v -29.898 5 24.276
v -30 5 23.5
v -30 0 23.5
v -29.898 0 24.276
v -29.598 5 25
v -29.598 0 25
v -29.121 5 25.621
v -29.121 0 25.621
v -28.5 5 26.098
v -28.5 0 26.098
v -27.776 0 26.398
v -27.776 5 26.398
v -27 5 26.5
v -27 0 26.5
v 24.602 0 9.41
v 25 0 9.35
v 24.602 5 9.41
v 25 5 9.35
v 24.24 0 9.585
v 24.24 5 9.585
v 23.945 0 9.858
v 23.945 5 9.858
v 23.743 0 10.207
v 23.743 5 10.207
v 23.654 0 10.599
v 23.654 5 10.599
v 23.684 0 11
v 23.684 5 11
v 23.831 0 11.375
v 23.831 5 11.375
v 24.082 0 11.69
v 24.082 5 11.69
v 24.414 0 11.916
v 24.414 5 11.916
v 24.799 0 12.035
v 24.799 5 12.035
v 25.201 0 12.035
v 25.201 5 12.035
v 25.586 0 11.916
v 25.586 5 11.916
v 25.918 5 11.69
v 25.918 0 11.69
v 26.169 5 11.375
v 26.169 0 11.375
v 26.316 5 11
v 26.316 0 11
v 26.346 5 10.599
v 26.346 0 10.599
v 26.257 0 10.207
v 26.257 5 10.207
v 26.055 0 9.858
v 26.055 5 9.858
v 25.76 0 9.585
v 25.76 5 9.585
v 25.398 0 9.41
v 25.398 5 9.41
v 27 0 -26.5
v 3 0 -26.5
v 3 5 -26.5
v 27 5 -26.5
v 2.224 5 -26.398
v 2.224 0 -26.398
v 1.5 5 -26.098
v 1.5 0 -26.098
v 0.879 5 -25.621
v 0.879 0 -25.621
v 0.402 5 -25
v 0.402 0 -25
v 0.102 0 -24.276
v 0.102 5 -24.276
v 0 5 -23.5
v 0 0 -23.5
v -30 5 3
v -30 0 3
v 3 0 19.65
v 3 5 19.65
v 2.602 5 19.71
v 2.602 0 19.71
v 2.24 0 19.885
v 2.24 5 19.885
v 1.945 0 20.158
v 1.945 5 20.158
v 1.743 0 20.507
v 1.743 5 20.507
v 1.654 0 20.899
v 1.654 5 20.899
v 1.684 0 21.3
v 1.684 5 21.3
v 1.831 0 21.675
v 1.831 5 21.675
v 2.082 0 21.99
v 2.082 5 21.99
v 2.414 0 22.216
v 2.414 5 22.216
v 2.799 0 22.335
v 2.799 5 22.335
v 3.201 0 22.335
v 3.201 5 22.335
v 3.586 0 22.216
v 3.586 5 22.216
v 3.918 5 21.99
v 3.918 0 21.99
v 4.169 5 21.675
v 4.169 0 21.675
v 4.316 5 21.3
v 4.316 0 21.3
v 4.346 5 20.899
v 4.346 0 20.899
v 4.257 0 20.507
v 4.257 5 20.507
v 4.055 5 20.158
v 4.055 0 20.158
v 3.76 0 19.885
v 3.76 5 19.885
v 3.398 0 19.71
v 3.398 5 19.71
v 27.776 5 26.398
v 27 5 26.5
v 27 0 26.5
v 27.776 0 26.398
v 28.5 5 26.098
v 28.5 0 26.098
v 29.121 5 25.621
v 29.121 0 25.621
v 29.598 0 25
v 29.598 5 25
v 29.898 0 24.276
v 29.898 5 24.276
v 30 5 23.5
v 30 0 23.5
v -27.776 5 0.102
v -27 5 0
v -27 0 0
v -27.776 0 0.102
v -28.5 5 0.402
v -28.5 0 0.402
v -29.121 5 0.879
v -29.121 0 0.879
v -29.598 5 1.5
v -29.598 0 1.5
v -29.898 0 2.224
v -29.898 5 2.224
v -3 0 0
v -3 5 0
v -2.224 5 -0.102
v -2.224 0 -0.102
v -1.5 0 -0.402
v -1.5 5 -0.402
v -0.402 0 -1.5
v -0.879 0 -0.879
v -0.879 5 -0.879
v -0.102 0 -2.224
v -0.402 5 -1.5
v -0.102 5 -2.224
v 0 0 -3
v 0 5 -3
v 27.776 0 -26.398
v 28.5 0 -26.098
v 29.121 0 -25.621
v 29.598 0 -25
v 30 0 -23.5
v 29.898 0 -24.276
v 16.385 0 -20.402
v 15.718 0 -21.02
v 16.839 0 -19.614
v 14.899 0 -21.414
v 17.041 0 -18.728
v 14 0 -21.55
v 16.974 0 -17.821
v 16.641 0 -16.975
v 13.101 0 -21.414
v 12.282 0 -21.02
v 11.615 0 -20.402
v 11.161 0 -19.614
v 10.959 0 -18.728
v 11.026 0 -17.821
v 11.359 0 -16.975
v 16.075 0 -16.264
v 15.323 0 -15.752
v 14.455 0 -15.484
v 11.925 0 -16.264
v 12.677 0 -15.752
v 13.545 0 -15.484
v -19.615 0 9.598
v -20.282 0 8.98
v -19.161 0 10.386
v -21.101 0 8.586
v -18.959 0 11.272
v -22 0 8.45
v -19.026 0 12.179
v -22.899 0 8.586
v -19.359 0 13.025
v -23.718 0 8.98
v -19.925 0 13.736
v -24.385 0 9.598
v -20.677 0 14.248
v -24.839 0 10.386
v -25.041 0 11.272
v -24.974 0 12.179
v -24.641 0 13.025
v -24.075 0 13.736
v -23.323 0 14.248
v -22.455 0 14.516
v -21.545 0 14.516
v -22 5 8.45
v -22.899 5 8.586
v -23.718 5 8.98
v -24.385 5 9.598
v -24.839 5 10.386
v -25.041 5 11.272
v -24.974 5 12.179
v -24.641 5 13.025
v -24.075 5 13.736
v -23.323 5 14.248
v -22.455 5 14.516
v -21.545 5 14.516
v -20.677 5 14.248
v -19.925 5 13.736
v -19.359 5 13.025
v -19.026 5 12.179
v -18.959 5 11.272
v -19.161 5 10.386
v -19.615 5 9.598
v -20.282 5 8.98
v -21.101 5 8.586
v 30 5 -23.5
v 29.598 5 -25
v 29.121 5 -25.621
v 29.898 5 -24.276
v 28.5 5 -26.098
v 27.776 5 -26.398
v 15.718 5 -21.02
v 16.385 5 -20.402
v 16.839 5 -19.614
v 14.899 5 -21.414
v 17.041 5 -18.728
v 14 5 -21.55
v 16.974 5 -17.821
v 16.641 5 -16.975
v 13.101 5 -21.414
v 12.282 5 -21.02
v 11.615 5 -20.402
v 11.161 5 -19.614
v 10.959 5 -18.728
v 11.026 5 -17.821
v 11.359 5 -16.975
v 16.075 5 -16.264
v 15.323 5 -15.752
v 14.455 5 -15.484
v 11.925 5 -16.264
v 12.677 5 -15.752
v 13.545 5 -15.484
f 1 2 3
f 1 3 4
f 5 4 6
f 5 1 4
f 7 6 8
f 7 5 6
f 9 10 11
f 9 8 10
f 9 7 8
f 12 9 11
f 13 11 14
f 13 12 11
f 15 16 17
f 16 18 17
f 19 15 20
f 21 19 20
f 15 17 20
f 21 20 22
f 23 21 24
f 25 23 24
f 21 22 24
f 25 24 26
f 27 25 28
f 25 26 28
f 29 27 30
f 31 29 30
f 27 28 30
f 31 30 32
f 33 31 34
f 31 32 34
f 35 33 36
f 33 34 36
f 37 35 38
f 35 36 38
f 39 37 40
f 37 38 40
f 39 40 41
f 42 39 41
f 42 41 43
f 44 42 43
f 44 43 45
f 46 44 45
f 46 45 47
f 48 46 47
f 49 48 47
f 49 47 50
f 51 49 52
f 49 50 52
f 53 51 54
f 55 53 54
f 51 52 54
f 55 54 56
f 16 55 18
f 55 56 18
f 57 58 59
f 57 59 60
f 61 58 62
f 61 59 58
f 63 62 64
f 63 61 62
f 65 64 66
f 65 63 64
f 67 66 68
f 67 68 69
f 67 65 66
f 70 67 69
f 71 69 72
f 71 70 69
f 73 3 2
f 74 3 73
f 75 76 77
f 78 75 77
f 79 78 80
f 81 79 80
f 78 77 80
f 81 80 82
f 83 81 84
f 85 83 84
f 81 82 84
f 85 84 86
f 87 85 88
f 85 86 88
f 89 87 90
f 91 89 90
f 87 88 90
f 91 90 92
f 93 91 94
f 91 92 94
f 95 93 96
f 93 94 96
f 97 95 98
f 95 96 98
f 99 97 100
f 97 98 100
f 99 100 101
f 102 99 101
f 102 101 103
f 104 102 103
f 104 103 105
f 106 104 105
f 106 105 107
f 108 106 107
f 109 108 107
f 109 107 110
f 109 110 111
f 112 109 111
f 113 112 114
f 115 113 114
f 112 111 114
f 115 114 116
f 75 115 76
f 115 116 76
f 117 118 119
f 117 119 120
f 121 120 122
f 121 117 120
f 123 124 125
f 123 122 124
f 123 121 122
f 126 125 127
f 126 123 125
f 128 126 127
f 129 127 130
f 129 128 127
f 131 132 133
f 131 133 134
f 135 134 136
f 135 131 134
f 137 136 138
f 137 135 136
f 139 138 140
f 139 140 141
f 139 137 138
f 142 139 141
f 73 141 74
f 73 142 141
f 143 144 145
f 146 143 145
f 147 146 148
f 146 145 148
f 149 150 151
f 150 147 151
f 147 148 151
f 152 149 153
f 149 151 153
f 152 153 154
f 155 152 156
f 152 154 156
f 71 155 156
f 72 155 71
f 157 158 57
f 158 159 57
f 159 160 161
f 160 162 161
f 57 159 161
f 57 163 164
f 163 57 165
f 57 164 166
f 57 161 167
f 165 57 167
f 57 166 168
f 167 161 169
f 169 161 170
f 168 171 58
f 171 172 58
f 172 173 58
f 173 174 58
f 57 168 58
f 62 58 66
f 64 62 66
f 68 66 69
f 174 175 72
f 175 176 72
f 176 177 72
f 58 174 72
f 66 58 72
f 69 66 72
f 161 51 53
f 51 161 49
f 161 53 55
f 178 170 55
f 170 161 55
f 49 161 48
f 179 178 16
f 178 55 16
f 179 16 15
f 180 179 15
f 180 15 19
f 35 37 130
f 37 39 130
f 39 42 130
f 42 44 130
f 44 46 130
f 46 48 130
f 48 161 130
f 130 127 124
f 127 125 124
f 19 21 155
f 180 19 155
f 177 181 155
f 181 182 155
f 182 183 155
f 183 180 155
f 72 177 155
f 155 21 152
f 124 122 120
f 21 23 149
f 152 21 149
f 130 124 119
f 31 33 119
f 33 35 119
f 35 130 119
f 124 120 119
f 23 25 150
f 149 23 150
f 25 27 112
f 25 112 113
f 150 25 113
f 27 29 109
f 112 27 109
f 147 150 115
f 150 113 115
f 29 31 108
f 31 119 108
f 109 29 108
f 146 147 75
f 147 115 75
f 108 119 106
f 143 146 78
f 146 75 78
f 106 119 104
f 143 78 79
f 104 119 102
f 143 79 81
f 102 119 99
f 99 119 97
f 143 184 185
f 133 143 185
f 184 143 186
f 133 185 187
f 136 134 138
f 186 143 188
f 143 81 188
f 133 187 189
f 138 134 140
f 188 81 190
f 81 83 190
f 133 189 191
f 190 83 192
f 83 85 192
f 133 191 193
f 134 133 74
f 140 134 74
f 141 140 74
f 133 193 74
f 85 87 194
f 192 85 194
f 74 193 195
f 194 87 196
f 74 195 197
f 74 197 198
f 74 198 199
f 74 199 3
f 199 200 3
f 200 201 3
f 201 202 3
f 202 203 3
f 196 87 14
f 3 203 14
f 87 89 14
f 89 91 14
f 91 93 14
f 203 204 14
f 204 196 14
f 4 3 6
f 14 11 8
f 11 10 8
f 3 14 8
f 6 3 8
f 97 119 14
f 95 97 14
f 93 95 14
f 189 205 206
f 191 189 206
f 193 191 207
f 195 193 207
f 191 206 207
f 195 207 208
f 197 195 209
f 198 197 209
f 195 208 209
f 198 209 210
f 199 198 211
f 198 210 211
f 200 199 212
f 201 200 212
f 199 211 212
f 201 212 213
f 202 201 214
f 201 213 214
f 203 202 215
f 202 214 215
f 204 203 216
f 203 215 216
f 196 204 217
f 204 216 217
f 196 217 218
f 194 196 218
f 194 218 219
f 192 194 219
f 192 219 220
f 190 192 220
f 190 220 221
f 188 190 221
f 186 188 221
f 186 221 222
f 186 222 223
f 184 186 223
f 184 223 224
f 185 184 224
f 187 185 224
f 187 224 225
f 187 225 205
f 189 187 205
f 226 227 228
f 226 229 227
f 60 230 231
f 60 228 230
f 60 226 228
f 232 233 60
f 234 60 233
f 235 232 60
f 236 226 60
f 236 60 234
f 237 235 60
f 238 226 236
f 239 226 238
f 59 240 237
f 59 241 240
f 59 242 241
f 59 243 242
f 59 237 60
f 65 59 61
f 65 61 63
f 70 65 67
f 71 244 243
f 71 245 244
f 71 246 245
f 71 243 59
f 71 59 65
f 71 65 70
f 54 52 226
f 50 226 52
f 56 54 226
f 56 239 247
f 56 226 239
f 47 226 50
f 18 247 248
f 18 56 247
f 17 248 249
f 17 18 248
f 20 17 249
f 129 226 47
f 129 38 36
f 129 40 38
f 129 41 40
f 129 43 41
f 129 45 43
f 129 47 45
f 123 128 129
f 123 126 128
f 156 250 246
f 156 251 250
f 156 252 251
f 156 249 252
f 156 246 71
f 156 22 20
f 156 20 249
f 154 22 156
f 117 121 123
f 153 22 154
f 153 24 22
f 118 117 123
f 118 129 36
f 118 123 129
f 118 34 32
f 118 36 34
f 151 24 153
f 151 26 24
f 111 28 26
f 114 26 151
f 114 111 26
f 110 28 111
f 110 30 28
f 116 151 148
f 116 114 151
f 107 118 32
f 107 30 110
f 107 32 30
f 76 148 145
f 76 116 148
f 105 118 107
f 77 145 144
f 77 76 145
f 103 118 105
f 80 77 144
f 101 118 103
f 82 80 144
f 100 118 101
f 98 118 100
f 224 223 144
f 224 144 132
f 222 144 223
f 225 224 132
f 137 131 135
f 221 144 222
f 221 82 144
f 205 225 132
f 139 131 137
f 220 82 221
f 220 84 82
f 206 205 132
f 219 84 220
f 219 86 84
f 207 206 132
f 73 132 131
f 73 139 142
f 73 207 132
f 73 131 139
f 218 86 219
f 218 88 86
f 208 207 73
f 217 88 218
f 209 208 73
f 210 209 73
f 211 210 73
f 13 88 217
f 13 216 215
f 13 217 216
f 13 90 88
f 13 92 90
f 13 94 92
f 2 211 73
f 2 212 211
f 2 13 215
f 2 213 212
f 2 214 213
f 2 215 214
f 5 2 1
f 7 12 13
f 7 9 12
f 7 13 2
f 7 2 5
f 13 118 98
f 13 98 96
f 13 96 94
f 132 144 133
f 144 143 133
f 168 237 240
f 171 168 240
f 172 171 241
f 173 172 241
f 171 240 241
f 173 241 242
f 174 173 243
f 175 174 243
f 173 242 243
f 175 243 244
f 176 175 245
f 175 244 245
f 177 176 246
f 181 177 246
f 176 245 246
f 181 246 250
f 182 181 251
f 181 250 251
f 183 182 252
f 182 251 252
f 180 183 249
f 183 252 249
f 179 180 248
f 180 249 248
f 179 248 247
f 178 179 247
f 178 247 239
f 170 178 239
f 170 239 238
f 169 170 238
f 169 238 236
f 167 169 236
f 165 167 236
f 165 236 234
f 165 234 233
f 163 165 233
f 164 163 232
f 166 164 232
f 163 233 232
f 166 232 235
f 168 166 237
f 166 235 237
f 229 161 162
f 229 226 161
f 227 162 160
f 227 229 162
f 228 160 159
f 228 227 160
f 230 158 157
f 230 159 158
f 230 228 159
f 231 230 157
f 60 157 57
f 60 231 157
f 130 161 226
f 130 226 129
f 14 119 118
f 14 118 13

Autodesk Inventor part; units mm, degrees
ref_plane "YZ Plane" through (0, 0, 0) normal (1, 0, 0) x (0, 1, 0)
ref_plane "XZ Plane" through (0, 0, 0) normal (0, 1, 0) x (-1, 0, 0)
ref_plane "XY Plane" through (0, 0, 0) normal (0, 0, 1) x (1, 0, 0)
sketch "Sketch1" plane through (0, 0, 0) normal (0, 1, 0) x (-1, 0, 0)
  line L0 (30, -26.5) -> (-30, -26.5)
  line L1 (-30, -26.5) -> (-30, 26.5)
  line L2 (-30, 26.5) -> (30, 26.5)
  line L3 (30, 26.5) -> (30, -26.5)
  line L4 (30, -26.5) -> (-30, 26.5) construction
  line L5 (-30, -26.5) -> (30, 26.5) construction
  line L6 (-3, 21) -> (-25, 21) construction
  line L7 (-25, 21) -> (-25, 10.7) construction
  line L8 (-25, 10.7) -> (-3, 10.7) construction
  line L9 (-3, 10.7) -> (-3, 21) construction
  line L10 (0, 0) -> (30, 0)
  line L11 (0, 0) -> (0, -26.5)
  point P0 (-14, -18.5)
  point P1 (-14, 10.7)
  point P2 (22, 11.5)
  dimension "d0" = 60
  dimension "d1" = 53
  dimension "d2" = 5
  dimension "d3" = 5.5
  dimension "d4" = 22
  dimension "d5" = 10.3
  dimension "d6" = 45
  dimension "d7" = 8
  dimension "d8" = 15
extrude "Extrusion1" add sketch "Sketch1" along normal blind 5 contours L0 L1 L2 L3 L10 L11
hole "Hole1" at (3, 0, 21) at (25, 0, 10.7) direction (0, 1, 0) diameter 2.7 end through all
hole "Hole2" at (14, 0, -18.5) at (-22, 0, 11.5) direction (0, 1, 0) diameter 6.1 end through all
fillet "Fillet1" radius 3 6 edges at (-30, 2.5, 26.5) (30, 2.5, 26.5) (30, 2.5, -26.5) (0, 2.5, -26.5) (0, 2.5, 0) (-30, 2.5, 0)
properties part number "Limit SW Bracket Left" material "ABS Plastic"
